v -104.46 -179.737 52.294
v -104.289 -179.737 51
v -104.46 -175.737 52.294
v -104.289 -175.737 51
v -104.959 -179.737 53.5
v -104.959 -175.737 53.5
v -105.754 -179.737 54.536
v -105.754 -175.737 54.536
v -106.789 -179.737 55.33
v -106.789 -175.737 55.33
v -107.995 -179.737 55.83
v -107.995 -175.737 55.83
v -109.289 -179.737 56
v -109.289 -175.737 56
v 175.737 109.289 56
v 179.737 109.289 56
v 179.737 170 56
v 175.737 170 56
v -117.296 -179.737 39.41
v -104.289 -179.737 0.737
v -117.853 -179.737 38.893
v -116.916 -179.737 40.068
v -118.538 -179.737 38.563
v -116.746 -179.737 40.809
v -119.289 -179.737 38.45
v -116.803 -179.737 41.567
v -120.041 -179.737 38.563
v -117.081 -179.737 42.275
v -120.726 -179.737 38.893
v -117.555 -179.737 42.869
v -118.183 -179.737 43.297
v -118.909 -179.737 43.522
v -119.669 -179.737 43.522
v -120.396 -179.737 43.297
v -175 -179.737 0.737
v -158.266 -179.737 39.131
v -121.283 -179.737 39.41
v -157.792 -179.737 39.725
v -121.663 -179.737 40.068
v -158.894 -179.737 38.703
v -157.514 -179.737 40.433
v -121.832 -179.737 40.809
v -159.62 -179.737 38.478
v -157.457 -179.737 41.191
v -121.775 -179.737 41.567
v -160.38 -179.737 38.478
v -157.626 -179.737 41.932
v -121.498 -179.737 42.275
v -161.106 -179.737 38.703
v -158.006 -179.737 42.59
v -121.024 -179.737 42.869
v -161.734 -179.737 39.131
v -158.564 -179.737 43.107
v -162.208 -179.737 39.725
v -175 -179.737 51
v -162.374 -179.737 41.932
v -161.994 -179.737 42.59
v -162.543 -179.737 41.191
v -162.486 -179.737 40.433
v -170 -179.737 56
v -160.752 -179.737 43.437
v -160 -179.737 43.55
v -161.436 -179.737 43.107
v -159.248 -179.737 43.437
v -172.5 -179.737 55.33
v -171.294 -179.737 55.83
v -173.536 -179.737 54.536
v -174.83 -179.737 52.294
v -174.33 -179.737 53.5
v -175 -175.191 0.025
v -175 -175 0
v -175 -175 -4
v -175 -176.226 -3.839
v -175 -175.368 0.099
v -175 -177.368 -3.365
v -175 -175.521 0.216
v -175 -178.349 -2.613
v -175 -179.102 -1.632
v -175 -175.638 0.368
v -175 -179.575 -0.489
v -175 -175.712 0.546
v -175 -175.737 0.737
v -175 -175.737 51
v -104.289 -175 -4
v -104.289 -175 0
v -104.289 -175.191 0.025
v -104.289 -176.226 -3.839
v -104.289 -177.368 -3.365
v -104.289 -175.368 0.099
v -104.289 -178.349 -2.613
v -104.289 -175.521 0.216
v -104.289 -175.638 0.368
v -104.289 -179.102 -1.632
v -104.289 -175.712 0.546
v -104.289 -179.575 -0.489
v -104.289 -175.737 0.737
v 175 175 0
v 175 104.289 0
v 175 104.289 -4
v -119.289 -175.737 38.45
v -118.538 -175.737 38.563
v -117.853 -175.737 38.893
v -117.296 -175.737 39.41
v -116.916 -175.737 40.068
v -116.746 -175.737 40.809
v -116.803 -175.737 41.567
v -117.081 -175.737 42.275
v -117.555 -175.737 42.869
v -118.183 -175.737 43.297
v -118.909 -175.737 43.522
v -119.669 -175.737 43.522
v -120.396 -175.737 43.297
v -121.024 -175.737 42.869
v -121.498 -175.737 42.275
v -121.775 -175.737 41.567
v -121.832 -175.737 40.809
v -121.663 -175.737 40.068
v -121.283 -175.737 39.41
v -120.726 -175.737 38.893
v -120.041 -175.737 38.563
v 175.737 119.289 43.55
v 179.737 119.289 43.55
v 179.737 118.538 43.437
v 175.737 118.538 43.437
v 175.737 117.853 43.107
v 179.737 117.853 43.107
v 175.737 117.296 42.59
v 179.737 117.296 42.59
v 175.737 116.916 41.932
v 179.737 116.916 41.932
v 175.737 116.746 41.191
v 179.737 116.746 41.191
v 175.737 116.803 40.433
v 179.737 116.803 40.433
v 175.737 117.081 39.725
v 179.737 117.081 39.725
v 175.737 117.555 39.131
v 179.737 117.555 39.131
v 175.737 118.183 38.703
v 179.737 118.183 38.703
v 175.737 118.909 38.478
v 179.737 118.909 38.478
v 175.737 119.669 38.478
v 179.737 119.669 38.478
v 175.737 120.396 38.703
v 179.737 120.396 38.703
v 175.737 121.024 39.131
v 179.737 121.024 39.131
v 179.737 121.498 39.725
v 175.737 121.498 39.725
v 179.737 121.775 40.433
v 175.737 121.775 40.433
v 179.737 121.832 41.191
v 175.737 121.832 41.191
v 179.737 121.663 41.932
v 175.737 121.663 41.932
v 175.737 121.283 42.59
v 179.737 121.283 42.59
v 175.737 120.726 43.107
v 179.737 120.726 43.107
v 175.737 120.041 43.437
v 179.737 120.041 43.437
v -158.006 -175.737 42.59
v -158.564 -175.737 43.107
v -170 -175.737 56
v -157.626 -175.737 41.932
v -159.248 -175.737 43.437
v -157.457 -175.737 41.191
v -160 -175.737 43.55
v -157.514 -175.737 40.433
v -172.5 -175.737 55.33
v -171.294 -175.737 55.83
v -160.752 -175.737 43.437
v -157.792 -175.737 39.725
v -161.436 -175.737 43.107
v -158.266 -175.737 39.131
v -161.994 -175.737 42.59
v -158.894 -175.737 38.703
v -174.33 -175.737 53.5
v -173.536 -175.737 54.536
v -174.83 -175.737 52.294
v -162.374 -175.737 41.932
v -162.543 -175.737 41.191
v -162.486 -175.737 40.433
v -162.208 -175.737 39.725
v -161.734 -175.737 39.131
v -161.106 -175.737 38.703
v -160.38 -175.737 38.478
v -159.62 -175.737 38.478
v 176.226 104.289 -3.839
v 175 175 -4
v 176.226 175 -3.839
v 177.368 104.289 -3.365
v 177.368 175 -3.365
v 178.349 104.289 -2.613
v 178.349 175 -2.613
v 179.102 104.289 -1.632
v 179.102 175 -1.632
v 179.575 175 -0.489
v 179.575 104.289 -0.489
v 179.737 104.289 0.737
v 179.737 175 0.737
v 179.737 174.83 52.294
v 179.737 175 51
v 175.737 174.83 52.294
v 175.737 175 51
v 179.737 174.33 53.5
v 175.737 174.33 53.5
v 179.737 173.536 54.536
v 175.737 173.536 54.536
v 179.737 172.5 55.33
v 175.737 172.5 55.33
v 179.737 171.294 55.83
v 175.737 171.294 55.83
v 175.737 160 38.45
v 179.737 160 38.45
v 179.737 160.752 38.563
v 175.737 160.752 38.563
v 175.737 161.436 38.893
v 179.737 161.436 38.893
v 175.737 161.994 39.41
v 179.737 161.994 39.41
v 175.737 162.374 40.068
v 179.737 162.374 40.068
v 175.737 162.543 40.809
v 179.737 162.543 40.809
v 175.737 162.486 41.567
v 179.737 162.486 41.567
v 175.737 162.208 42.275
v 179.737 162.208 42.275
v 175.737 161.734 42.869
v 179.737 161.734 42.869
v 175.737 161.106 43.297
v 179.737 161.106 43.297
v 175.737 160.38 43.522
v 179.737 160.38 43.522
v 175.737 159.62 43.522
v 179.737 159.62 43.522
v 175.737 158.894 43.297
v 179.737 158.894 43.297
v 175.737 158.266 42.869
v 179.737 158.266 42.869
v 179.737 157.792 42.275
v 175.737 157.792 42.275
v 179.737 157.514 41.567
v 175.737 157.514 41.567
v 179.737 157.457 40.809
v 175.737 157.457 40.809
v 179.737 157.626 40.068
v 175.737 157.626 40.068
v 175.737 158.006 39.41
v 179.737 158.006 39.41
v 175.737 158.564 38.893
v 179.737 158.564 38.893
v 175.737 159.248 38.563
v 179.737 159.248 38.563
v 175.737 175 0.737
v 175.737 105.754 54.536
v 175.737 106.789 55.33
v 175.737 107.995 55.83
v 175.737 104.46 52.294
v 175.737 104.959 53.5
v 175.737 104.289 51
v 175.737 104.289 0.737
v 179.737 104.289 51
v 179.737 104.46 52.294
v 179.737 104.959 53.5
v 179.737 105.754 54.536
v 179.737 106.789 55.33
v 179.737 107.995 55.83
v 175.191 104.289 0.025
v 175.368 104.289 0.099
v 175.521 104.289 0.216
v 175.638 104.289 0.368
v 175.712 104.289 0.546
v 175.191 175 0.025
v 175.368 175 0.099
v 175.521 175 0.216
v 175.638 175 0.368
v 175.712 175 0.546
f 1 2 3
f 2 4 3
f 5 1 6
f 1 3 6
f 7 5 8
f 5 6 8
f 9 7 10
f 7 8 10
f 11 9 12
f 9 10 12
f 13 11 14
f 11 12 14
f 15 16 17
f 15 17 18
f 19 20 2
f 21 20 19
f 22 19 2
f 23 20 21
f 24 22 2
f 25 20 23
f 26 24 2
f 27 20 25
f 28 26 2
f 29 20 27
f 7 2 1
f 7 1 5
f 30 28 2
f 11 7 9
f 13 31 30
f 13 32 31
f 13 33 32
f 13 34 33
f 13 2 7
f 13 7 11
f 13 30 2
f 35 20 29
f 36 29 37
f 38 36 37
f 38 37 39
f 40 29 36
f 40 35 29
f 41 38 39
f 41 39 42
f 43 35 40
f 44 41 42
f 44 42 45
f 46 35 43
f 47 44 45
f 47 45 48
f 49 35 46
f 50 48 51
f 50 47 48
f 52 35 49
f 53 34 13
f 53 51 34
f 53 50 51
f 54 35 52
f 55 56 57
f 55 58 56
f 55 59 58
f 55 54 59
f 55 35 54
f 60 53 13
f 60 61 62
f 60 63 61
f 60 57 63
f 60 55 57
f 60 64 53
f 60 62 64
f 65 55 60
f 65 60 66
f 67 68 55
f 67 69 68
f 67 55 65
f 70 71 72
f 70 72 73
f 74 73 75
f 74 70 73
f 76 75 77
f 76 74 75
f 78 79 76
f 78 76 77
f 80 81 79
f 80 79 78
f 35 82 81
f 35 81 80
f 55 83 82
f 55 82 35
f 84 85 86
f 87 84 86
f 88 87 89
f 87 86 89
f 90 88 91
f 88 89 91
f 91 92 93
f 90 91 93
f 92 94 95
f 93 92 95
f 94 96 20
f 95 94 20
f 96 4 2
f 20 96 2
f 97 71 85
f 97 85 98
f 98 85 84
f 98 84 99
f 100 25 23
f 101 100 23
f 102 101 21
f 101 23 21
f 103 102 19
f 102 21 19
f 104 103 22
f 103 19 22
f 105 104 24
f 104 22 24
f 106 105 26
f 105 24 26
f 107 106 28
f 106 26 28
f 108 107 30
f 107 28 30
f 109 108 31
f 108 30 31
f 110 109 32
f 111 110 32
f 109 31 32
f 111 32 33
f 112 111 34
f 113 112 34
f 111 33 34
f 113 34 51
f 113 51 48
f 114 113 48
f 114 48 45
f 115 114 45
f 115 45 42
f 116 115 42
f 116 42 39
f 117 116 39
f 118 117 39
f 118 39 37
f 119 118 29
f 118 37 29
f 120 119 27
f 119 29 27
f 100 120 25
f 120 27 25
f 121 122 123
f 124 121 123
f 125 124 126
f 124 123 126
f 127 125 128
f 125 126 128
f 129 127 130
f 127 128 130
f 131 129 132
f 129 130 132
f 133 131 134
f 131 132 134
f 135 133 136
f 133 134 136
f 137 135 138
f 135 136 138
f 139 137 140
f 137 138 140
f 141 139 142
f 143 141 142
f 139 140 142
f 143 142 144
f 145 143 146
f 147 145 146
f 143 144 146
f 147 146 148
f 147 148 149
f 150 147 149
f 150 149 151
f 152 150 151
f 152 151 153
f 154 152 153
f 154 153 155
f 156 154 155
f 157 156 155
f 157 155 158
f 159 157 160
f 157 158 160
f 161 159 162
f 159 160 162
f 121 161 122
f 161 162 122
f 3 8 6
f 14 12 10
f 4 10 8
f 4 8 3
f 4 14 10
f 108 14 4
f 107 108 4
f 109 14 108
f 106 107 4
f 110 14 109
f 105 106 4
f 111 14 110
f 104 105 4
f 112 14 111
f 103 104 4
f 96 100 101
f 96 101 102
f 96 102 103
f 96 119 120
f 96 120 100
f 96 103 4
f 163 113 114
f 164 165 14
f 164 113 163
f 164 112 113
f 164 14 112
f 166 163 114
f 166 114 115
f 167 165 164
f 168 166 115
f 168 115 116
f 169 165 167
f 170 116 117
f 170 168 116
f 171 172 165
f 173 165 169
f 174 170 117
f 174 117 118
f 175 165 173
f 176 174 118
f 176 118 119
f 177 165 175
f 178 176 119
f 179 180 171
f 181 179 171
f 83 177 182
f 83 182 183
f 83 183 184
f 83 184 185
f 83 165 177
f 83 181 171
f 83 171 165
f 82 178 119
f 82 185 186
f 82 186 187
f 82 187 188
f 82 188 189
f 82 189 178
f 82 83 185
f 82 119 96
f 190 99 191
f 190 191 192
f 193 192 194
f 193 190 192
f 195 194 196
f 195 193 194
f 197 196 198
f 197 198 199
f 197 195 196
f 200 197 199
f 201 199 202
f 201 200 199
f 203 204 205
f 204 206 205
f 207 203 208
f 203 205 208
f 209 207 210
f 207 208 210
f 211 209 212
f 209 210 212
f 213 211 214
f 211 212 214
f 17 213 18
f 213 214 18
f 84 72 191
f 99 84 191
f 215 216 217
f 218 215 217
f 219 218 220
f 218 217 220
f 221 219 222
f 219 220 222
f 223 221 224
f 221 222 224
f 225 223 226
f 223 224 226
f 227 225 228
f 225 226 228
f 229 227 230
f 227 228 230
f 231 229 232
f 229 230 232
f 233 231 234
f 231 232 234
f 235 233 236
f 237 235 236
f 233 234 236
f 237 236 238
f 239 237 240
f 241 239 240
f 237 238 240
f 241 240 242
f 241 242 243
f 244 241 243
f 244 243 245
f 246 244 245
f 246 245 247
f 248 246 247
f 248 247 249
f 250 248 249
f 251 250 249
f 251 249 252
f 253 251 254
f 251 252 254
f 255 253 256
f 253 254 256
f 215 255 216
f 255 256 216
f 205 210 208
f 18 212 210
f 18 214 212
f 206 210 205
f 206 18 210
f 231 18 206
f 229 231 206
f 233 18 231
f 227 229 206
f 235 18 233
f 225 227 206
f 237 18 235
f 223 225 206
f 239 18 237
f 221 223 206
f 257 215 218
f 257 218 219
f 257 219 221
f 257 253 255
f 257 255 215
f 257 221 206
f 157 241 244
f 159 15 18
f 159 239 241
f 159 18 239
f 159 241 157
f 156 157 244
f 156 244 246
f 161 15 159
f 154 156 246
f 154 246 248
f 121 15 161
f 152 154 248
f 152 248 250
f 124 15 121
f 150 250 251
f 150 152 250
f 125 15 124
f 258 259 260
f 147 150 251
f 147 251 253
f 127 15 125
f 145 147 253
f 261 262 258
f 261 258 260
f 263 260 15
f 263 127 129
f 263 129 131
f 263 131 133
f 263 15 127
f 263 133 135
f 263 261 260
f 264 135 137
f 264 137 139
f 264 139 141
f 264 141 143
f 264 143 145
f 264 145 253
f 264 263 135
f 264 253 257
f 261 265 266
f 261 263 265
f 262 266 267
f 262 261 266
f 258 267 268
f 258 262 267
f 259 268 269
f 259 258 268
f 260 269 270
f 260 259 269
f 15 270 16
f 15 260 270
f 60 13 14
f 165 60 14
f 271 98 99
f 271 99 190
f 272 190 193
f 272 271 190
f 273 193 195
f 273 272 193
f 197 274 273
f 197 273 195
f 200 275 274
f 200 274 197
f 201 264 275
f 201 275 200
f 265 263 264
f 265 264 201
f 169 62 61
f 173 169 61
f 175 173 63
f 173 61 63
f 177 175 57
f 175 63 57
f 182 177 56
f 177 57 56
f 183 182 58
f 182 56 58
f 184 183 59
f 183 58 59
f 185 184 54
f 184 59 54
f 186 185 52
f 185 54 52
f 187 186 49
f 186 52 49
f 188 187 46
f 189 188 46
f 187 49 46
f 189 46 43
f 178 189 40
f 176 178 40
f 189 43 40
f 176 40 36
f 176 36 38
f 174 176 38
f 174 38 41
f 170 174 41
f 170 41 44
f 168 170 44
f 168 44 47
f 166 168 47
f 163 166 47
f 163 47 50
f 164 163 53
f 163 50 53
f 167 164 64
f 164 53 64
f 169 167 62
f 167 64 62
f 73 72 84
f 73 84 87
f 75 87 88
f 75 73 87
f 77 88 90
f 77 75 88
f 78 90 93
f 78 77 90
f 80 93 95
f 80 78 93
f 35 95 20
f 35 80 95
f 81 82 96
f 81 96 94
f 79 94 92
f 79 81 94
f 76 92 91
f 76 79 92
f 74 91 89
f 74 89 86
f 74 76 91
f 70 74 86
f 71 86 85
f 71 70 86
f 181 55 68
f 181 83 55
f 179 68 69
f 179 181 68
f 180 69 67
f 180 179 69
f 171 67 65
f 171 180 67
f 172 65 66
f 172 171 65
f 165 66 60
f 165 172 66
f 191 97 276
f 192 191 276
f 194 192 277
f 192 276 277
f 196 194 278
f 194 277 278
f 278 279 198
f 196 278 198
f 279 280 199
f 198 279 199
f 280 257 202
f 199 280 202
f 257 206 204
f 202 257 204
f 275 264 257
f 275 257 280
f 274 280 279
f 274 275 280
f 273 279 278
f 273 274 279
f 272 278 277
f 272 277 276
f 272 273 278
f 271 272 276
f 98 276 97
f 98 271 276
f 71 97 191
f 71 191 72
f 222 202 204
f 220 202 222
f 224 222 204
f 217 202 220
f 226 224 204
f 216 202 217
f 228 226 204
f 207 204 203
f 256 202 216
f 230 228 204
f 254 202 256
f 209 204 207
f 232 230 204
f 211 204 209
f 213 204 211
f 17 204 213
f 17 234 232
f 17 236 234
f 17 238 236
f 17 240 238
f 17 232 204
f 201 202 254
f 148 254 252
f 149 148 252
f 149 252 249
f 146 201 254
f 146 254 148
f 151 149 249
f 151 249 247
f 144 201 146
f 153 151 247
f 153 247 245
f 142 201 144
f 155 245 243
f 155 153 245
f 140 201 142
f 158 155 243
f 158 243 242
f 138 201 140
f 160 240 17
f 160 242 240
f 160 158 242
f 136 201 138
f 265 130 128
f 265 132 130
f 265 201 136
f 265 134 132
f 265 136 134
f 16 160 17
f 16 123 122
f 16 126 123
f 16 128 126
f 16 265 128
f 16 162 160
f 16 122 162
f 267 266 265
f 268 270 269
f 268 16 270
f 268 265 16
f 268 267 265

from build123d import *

# Parameters (mm, degrees)
BASE_FLANGE1_DEPTH      = 4
EDGE_FLANGE1_DEPTH      = 70.710678119
EDGE_FLANGE1_BEND_DEPTH = 70.710678119
SKETCH13_R              = 2.55
CUT_EXTRUDE1_DEPTH      = 4
SKETCH14_R              = 2.55
CUT_EXTRUDE2_DEPTH      = 4
FILLET1_R               = 5


# Sheet-metal steps are written as plain solids
with BuildPart() as part:
    # Sketch1 → Base-Flange1 (new body)
    with BuildSketch(Plane.XY):
        Polygon((175, 175), (-175, -175), (-104.289321881, -175), (175, 104.289321881), align=None)
    extrude(amount=-BASE_FLANGE1_DEPTH)

    # Edge-Flange1 section (across the edge) → Edge-Flange1 (add)
    with BuildSketch(Plane(origin=(175.7366, 104.289321881, 0), x_dir=(-1, 0, 0), z_dir=(0, 1, 0))):
        with BuildLine():
            Line((-4, 0.7366), (-4, 56))
            Line((-4, 56), (0, 56))
            Line((0, 56), (0, 0.7366))
            ThreePointArc((0, 0.7366), (0.215745145, 0.215745145), (0.7366, 0))
            Line((0.7366, 0), (0.7366, -4))
            ThreePointArc((0.7366, -4), (-2.61268198, -2.61268198), (-4, 0.7366))
        make_face()
    extrude(amount=EDGE_FLANGE1_DEPTH)

    # Edge-Flange1 section 2 (across the edge) → Edge-Flange1 bend (add)
    with BuildSketch(Plane(origin=(-175, -175.7366, 0), x_dir=(0, 1, 0), z_dir=(1, 0, 0))):
        with BuildLine():
            Line((-4, 0.7366), (-4, 56))
            Line((-4, 56), (0, 56))
            Line((0, 56), (0, 0.7366))
            ThreePointArc((0, 0.7366), (0.215745145, 0.215745145), (0.7366, 0))
            Line((0.7366, 0), (0.7366, -4))
            ThreePointArc((0.7366, -4), (-2.61268198, -2.61268198), (-4, 0.7366))
        make_face()
    extrude(amount=EDGE_FLANGE1_BEND_DEPTH)

    # Sketch13 → Cut-Extrude1 (cut)
    with BuildSketch(Plane(origin=(179.7366, 0, 0), x_dir=(0, 0, -1), z_dir=(1, 0, 0))):
        with Locations((-41, 160)):
            Circle(SKETCH13_R)
        with Locations(Location((-41, 119.289321881, 0), (0, 0, 180))):
            Circle(SKETCH13_R)
    extrude(amount=-CUT_EXTRUDE1_DEPTH, mode=Mode.SUBTRACT)

    # Sketch14 → Cut-Extrude2 (cut)
    with BuildSketch(Plane.XZ.offset(179.7366)):
        with Locations(Location((-119.289321881, 41, 0), (0, 0, 270))):
            Circle(SKETCH14_R)
        with Locations(Location((-160, 41, 0), (0, 0, 90))):
            Circle(SKETCH14_R)
    extrude(amount=-CUT_EXTRUDE2_DEPTH, mode=Mode.SUBTRACT)

    # Fillet1
    fillet1_edges = [part.edges().sort_by_distance(p)[0] for p in [
        (177.7366, 104.289321881, 56),
        (177.7366, 175, 56),
        (-175, -177.7366, 56),
        (-104.289321881, -177.7366, 56),
    ]]
    fillet(fillet1_edges, radius=FILLET1_R)


solid = part.part
